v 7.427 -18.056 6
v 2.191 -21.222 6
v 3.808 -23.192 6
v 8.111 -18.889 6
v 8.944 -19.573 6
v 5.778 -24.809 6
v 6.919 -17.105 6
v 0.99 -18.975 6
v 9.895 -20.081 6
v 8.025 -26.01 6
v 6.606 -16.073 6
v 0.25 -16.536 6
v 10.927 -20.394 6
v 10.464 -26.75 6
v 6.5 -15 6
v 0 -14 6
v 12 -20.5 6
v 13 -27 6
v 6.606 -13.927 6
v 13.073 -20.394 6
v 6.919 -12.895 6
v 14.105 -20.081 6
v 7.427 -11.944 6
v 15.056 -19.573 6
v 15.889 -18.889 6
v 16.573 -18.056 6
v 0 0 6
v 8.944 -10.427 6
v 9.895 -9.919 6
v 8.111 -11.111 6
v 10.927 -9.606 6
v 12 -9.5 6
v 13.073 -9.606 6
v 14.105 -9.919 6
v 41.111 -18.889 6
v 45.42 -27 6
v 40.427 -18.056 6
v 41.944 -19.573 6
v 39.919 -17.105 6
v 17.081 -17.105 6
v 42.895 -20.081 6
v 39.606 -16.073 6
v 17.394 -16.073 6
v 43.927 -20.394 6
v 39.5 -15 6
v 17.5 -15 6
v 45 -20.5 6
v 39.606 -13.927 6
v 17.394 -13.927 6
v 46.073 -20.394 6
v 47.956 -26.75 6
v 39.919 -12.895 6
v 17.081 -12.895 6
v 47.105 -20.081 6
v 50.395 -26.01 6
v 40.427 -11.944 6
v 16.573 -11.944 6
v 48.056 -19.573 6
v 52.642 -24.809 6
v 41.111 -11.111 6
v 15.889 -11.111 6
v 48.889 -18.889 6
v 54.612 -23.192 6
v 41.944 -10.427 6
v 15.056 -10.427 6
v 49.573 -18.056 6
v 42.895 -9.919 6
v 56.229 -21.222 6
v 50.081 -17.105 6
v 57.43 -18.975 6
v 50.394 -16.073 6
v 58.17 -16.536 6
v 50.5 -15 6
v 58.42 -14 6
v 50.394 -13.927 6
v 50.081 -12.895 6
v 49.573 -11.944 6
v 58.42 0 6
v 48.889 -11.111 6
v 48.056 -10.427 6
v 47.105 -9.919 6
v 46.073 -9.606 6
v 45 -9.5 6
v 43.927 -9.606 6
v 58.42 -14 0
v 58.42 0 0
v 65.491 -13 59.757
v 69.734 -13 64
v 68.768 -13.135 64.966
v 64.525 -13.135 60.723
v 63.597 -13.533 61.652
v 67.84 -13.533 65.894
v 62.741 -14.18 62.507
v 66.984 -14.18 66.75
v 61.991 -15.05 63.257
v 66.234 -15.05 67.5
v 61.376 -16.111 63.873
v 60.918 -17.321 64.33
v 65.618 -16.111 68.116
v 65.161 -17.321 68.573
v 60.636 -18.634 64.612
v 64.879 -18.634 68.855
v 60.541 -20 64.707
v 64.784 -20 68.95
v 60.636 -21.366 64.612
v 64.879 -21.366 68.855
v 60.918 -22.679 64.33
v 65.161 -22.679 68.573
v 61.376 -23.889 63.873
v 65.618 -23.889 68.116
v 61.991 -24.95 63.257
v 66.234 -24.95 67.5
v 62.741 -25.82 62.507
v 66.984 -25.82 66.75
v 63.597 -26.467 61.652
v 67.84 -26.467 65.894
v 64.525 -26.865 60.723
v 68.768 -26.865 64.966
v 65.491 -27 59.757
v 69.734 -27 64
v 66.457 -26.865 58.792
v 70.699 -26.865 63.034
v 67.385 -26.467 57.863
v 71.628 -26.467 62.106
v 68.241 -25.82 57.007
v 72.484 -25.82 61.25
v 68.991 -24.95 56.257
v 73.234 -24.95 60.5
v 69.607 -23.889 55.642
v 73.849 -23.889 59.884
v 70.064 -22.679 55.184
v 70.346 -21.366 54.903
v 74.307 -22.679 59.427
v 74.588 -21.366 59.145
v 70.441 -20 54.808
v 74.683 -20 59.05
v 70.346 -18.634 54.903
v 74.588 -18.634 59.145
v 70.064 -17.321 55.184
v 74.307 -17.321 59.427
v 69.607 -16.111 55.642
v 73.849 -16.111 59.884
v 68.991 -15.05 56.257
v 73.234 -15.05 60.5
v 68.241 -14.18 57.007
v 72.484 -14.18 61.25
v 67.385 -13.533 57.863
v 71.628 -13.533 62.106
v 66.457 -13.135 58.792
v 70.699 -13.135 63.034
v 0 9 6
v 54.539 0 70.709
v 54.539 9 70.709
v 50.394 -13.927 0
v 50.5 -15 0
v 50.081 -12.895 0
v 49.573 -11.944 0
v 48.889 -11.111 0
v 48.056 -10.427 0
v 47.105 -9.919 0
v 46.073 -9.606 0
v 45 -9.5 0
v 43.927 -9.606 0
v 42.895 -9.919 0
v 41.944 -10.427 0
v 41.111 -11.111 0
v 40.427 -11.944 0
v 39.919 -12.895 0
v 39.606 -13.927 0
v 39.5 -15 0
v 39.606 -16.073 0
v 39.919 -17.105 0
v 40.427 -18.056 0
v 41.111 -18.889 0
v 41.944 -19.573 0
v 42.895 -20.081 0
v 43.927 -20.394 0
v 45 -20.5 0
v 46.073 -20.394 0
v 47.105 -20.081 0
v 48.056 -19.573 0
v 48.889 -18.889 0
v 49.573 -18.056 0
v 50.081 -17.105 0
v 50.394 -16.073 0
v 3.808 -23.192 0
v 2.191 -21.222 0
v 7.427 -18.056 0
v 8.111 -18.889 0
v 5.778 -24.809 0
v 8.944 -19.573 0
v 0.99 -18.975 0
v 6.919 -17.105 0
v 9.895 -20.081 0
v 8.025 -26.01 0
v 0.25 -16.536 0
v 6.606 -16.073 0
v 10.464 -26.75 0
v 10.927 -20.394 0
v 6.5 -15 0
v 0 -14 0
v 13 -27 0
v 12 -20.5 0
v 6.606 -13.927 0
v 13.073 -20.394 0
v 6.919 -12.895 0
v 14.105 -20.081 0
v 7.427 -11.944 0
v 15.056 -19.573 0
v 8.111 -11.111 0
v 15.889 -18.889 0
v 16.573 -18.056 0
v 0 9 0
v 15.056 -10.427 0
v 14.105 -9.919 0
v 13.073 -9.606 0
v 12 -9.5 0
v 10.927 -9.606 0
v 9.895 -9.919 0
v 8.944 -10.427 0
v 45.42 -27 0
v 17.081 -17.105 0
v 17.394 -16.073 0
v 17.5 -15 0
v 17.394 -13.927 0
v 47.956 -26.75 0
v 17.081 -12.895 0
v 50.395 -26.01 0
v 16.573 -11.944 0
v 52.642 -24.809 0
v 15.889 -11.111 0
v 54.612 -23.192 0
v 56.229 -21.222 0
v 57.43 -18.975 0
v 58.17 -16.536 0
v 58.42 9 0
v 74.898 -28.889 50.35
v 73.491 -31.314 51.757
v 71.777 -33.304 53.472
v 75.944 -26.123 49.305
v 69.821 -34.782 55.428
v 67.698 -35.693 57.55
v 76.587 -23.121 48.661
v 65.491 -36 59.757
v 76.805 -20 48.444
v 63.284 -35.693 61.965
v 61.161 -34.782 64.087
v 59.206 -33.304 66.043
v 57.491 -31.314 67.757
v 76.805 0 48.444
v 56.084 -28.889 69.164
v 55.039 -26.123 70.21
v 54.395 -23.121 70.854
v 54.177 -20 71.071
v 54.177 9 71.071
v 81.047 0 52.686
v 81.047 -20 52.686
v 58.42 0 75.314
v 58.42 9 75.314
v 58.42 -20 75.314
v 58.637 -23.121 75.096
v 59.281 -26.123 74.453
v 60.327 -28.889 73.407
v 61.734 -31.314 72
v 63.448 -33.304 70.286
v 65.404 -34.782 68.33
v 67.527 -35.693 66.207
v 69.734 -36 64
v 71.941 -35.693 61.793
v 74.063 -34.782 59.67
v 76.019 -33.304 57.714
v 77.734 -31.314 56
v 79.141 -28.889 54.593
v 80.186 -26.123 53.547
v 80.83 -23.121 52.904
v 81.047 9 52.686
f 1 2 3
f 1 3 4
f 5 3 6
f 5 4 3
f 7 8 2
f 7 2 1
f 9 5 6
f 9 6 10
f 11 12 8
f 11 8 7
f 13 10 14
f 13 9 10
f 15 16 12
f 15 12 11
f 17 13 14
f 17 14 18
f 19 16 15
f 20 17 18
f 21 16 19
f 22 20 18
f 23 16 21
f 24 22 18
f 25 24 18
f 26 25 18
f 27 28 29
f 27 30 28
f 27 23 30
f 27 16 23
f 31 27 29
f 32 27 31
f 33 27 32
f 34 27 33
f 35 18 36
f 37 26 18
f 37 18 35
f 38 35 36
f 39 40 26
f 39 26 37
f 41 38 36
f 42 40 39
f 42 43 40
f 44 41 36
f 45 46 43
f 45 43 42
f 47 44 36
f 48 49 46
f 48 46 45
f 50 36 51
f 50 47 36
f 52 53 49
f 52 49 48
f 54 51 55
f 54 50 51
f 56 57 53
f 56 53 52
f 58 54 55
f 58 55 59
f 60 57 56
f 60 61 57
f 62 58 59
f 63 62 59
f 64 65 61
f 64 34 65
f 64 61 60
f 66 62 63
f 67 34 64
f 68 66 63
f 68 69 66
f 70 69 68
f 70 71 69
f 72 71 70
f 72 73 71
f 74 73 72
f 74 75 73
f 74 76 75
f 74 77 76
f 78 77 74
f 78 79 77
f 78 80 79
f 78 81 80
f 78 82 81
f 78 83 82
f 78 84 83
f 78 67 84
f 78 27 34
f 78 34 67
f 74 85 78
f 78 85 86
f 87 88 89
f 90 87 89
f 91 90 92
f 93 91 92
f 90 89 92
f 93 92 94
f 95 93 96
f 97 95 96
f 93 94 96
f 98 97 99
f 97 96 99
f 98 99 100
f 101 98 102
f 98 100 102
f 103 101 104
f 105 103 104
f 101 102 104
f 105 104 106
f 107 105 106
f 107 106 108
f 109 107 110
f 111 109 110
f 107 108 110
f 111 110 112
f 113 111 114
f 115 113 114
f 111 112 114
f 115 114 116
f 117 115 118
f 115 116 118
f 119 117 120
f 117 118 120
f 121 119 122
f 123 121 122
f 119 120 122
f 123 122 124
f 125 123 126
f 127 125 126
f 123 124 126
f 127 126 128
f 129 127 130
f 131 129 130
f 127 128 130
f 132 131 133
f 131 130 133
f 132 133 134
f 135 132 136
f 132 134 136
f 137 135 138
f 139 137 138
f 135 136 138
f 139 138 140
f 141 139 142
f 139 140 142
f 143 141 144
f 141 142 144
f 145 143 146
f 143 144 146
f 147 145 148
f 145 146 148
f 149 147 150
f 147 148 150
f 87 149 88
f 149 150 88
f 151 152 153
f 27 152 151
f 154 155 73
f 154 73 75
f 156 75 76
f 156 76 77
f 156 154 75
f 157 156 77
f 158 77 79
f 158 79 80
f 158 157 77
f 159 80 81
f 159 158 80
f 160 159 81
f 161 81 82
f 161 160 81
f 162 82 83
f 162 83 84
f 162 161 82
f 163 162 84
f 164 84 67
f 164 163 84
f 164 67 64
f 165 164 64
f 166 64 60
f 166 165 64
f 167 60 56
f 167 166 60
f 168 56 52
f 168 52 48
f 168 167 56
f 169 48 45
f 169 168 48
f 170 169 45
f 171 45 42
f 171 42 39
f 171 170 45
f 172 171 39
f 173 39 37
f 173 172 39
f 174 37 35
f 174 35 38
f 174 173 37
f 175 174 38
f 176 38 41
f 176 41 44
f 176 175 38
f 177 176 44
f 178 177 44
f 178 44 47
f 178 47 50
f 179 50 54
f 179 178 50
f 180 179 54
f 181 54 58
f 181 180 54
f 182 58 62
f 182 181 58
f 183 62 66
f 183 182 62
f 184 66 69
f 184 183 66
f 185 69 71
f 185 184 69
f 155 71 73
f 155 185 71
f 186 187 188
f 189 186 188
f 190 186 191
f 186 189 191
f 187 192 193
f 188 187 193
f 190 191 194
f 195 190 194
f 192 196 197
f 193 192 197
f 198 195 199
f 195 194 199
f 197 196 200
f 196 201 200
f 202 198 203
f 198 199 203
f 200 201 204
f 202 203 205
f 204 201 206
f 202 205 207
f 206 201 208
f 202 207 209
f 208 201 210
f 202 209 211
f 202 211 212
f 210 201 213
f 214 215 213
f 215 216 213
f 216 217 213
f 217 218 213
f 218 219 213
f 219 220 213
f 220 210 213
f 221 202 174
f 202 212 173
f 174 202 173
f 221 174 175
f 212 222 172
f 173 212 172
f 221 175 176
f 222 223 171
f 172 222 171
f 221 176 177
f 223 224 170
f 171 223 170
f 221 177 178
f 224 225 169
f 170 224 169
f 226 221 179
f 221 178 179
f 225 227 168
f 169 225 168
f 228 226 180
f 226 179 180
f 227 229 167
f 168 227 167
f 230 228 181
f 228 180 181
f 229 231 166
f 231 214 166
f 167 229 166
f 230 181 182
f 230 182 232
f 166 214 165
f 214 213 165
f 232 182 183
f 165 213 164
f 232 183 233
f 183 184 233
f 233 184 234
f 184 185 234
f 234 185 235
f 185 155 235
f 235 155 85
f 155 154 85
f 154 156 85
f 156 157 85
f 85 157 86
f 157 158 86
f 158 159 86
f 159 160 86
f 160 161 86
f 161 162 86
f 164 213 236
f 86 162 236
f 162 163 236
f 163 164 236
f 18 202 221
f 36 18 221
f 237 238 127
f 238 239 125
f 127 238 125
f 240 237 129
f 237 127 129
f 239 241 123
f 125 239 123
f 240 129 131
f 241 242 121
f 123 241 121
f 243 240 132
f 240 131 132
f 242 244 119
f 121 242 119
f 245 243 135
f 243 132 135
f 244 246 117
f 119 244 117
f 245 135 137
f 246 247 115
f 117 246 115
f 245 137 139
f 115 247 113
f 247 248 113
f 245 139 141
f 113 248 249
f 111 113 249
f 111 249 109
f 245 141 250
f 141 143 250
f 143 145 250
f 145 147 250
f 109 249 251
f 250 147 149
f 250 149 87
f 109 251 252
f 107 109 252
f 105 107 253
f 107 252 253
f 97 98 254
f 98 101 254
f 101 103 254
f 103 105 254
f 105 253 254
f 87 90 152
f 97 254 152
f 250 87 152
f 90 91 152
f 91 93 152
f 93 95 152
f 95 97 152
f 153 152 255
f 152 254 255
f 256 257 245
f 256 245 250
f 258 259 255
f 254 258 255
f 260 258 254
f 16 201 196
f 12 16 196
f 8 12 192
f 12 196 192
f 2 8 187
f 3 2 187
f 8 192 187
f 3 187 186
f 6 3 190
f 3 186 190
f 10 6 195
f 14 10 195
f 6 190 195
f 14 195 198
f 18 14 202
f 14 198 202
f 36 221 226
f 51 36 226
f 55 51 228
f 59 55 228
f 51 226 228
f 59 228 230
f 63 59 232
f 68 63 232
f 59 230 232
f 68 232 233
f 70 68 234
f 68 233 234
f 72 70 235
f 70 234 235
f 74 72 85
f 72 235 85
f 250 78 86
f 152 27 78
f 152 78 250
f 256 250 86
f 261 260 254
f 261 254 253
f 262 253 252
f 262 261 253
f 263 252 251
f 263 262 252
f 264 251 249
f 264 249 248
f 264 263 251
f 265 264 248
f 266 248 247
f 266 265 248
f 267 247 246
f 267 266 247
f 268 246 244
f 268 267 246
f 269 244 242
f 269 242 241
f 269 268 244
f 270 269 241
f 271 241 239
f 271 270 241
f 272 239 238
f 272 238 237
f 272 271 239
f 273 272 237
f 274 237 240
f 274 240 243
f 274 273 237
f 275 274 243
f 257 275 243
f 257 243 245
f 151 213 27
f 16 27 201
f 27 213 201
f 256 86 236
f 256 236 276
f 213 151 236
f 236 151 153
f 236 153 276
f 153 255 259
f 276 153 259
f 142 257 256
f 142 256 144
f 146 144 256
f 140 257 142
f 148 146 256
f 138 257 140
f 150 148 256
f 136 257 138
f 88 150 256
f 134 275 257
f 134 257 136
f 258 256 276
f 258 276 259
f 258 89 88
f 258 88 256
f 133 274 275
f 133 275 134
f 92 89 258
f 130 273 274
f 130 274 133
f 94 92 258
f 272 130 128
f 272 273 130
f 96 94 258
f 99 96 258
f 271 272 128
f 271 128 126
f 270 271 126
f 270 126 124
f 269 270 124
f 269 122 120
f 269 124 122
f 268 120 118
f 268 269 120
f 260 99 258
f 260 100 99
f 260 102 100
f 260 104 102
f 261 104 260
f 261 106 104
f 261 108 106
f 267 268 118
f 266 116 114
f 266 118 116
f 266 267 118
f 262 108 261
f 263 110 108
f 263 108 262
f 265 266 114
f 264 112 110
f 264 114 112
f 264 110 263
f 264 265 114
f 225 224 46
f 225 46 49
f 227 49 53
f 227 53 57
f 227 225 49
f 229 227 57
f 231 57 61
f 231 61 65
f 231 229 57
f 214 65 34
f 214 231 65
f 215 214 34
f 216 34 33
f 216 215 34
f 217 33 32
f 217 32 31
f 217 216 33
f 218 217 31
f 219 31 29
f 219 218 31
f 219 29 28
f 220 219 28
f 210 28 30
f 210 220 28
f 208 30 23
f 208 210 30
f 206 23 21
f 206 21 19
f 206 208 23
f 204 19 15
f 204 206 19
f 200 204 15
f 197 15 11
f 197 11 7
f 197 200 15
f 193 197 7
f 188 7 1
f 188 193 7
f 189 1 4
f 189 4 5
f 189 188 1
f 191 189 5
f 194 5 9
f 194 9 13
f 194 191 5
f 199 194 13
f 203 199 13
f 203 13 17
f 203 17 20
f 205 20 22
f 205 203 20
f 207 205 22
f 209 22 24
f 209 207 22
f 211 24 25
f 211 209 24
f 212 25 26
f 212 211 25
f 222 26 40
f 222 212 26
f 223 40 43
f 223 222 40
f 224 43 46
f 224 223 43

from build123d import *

# Parameters (mm, degrees)
F1_DEPTH = 9
F2_R     = 5.5
F3_DEPTH = 6
F5_R     = 7
F6_DEPTH = 6


with BuildPart() as f1:
    # F0 (on Front) → F1 (new body)
    with BuildSketch(Plane.XZ):
        Polygon((81.047416998, 52.686291501), (58.42, 75.313708499), (0, 6), (0, 0), (58.42, 0), align=None)
    extrude(amount=-F1_DEPTH)

    # F2 (on Top) → F3 (join)
    with BuildSketch(Plane.XY):
        with BuildLine():
            Line((58.42, 0), (0, 0))
            Line((0, 0), (0, -14))
            ThreePointArc((0, -14), (3.8076118446, -23.1923881554), (13, -27))
            Line((13, -27), (45.42, -27))
            ThreePointArc((45.42, -27), (54.6123881554, -23.1923881554), (58.42, -14))
            Line((58.42, -14), (58.42, 0))
        make_face()
        with Locations((12, -15)):
            Circle(F2_R, mode=Mode.SUBTRACT)
        with Locations((45, -15)):
            Circle(F2_R, mode=Mode.SUBTRACT)
    extrude(amount=F3_DEPTH)

    # F5 (on offset) → F6 (join)
    with BuildSketch(Plane(origin=(66.8668542495, 0, 66.8668542495), x_dir=(0, 1, 0), z_dir=(0.7071067812, 0, 0.7071067812))):
        with BuildLine():
            Line((9, -20.054344161), (9, 11.945655839))
            Line((9, 11.945655839), (-20, 11.945655839))
            ThreePointArc((-20, 11.945655839), (-36, -4.054344161), (-20, -20.054344161))
            Line((-20, -20.054344161), (9, -20.054344161))
        make_face()
        with Locations((-20, -4.054344161)):
            Circle(F5_R, mode=Mode.SUBTRACT)
    extrude(amount=-F6_DEPTH)


solid = f1.part
